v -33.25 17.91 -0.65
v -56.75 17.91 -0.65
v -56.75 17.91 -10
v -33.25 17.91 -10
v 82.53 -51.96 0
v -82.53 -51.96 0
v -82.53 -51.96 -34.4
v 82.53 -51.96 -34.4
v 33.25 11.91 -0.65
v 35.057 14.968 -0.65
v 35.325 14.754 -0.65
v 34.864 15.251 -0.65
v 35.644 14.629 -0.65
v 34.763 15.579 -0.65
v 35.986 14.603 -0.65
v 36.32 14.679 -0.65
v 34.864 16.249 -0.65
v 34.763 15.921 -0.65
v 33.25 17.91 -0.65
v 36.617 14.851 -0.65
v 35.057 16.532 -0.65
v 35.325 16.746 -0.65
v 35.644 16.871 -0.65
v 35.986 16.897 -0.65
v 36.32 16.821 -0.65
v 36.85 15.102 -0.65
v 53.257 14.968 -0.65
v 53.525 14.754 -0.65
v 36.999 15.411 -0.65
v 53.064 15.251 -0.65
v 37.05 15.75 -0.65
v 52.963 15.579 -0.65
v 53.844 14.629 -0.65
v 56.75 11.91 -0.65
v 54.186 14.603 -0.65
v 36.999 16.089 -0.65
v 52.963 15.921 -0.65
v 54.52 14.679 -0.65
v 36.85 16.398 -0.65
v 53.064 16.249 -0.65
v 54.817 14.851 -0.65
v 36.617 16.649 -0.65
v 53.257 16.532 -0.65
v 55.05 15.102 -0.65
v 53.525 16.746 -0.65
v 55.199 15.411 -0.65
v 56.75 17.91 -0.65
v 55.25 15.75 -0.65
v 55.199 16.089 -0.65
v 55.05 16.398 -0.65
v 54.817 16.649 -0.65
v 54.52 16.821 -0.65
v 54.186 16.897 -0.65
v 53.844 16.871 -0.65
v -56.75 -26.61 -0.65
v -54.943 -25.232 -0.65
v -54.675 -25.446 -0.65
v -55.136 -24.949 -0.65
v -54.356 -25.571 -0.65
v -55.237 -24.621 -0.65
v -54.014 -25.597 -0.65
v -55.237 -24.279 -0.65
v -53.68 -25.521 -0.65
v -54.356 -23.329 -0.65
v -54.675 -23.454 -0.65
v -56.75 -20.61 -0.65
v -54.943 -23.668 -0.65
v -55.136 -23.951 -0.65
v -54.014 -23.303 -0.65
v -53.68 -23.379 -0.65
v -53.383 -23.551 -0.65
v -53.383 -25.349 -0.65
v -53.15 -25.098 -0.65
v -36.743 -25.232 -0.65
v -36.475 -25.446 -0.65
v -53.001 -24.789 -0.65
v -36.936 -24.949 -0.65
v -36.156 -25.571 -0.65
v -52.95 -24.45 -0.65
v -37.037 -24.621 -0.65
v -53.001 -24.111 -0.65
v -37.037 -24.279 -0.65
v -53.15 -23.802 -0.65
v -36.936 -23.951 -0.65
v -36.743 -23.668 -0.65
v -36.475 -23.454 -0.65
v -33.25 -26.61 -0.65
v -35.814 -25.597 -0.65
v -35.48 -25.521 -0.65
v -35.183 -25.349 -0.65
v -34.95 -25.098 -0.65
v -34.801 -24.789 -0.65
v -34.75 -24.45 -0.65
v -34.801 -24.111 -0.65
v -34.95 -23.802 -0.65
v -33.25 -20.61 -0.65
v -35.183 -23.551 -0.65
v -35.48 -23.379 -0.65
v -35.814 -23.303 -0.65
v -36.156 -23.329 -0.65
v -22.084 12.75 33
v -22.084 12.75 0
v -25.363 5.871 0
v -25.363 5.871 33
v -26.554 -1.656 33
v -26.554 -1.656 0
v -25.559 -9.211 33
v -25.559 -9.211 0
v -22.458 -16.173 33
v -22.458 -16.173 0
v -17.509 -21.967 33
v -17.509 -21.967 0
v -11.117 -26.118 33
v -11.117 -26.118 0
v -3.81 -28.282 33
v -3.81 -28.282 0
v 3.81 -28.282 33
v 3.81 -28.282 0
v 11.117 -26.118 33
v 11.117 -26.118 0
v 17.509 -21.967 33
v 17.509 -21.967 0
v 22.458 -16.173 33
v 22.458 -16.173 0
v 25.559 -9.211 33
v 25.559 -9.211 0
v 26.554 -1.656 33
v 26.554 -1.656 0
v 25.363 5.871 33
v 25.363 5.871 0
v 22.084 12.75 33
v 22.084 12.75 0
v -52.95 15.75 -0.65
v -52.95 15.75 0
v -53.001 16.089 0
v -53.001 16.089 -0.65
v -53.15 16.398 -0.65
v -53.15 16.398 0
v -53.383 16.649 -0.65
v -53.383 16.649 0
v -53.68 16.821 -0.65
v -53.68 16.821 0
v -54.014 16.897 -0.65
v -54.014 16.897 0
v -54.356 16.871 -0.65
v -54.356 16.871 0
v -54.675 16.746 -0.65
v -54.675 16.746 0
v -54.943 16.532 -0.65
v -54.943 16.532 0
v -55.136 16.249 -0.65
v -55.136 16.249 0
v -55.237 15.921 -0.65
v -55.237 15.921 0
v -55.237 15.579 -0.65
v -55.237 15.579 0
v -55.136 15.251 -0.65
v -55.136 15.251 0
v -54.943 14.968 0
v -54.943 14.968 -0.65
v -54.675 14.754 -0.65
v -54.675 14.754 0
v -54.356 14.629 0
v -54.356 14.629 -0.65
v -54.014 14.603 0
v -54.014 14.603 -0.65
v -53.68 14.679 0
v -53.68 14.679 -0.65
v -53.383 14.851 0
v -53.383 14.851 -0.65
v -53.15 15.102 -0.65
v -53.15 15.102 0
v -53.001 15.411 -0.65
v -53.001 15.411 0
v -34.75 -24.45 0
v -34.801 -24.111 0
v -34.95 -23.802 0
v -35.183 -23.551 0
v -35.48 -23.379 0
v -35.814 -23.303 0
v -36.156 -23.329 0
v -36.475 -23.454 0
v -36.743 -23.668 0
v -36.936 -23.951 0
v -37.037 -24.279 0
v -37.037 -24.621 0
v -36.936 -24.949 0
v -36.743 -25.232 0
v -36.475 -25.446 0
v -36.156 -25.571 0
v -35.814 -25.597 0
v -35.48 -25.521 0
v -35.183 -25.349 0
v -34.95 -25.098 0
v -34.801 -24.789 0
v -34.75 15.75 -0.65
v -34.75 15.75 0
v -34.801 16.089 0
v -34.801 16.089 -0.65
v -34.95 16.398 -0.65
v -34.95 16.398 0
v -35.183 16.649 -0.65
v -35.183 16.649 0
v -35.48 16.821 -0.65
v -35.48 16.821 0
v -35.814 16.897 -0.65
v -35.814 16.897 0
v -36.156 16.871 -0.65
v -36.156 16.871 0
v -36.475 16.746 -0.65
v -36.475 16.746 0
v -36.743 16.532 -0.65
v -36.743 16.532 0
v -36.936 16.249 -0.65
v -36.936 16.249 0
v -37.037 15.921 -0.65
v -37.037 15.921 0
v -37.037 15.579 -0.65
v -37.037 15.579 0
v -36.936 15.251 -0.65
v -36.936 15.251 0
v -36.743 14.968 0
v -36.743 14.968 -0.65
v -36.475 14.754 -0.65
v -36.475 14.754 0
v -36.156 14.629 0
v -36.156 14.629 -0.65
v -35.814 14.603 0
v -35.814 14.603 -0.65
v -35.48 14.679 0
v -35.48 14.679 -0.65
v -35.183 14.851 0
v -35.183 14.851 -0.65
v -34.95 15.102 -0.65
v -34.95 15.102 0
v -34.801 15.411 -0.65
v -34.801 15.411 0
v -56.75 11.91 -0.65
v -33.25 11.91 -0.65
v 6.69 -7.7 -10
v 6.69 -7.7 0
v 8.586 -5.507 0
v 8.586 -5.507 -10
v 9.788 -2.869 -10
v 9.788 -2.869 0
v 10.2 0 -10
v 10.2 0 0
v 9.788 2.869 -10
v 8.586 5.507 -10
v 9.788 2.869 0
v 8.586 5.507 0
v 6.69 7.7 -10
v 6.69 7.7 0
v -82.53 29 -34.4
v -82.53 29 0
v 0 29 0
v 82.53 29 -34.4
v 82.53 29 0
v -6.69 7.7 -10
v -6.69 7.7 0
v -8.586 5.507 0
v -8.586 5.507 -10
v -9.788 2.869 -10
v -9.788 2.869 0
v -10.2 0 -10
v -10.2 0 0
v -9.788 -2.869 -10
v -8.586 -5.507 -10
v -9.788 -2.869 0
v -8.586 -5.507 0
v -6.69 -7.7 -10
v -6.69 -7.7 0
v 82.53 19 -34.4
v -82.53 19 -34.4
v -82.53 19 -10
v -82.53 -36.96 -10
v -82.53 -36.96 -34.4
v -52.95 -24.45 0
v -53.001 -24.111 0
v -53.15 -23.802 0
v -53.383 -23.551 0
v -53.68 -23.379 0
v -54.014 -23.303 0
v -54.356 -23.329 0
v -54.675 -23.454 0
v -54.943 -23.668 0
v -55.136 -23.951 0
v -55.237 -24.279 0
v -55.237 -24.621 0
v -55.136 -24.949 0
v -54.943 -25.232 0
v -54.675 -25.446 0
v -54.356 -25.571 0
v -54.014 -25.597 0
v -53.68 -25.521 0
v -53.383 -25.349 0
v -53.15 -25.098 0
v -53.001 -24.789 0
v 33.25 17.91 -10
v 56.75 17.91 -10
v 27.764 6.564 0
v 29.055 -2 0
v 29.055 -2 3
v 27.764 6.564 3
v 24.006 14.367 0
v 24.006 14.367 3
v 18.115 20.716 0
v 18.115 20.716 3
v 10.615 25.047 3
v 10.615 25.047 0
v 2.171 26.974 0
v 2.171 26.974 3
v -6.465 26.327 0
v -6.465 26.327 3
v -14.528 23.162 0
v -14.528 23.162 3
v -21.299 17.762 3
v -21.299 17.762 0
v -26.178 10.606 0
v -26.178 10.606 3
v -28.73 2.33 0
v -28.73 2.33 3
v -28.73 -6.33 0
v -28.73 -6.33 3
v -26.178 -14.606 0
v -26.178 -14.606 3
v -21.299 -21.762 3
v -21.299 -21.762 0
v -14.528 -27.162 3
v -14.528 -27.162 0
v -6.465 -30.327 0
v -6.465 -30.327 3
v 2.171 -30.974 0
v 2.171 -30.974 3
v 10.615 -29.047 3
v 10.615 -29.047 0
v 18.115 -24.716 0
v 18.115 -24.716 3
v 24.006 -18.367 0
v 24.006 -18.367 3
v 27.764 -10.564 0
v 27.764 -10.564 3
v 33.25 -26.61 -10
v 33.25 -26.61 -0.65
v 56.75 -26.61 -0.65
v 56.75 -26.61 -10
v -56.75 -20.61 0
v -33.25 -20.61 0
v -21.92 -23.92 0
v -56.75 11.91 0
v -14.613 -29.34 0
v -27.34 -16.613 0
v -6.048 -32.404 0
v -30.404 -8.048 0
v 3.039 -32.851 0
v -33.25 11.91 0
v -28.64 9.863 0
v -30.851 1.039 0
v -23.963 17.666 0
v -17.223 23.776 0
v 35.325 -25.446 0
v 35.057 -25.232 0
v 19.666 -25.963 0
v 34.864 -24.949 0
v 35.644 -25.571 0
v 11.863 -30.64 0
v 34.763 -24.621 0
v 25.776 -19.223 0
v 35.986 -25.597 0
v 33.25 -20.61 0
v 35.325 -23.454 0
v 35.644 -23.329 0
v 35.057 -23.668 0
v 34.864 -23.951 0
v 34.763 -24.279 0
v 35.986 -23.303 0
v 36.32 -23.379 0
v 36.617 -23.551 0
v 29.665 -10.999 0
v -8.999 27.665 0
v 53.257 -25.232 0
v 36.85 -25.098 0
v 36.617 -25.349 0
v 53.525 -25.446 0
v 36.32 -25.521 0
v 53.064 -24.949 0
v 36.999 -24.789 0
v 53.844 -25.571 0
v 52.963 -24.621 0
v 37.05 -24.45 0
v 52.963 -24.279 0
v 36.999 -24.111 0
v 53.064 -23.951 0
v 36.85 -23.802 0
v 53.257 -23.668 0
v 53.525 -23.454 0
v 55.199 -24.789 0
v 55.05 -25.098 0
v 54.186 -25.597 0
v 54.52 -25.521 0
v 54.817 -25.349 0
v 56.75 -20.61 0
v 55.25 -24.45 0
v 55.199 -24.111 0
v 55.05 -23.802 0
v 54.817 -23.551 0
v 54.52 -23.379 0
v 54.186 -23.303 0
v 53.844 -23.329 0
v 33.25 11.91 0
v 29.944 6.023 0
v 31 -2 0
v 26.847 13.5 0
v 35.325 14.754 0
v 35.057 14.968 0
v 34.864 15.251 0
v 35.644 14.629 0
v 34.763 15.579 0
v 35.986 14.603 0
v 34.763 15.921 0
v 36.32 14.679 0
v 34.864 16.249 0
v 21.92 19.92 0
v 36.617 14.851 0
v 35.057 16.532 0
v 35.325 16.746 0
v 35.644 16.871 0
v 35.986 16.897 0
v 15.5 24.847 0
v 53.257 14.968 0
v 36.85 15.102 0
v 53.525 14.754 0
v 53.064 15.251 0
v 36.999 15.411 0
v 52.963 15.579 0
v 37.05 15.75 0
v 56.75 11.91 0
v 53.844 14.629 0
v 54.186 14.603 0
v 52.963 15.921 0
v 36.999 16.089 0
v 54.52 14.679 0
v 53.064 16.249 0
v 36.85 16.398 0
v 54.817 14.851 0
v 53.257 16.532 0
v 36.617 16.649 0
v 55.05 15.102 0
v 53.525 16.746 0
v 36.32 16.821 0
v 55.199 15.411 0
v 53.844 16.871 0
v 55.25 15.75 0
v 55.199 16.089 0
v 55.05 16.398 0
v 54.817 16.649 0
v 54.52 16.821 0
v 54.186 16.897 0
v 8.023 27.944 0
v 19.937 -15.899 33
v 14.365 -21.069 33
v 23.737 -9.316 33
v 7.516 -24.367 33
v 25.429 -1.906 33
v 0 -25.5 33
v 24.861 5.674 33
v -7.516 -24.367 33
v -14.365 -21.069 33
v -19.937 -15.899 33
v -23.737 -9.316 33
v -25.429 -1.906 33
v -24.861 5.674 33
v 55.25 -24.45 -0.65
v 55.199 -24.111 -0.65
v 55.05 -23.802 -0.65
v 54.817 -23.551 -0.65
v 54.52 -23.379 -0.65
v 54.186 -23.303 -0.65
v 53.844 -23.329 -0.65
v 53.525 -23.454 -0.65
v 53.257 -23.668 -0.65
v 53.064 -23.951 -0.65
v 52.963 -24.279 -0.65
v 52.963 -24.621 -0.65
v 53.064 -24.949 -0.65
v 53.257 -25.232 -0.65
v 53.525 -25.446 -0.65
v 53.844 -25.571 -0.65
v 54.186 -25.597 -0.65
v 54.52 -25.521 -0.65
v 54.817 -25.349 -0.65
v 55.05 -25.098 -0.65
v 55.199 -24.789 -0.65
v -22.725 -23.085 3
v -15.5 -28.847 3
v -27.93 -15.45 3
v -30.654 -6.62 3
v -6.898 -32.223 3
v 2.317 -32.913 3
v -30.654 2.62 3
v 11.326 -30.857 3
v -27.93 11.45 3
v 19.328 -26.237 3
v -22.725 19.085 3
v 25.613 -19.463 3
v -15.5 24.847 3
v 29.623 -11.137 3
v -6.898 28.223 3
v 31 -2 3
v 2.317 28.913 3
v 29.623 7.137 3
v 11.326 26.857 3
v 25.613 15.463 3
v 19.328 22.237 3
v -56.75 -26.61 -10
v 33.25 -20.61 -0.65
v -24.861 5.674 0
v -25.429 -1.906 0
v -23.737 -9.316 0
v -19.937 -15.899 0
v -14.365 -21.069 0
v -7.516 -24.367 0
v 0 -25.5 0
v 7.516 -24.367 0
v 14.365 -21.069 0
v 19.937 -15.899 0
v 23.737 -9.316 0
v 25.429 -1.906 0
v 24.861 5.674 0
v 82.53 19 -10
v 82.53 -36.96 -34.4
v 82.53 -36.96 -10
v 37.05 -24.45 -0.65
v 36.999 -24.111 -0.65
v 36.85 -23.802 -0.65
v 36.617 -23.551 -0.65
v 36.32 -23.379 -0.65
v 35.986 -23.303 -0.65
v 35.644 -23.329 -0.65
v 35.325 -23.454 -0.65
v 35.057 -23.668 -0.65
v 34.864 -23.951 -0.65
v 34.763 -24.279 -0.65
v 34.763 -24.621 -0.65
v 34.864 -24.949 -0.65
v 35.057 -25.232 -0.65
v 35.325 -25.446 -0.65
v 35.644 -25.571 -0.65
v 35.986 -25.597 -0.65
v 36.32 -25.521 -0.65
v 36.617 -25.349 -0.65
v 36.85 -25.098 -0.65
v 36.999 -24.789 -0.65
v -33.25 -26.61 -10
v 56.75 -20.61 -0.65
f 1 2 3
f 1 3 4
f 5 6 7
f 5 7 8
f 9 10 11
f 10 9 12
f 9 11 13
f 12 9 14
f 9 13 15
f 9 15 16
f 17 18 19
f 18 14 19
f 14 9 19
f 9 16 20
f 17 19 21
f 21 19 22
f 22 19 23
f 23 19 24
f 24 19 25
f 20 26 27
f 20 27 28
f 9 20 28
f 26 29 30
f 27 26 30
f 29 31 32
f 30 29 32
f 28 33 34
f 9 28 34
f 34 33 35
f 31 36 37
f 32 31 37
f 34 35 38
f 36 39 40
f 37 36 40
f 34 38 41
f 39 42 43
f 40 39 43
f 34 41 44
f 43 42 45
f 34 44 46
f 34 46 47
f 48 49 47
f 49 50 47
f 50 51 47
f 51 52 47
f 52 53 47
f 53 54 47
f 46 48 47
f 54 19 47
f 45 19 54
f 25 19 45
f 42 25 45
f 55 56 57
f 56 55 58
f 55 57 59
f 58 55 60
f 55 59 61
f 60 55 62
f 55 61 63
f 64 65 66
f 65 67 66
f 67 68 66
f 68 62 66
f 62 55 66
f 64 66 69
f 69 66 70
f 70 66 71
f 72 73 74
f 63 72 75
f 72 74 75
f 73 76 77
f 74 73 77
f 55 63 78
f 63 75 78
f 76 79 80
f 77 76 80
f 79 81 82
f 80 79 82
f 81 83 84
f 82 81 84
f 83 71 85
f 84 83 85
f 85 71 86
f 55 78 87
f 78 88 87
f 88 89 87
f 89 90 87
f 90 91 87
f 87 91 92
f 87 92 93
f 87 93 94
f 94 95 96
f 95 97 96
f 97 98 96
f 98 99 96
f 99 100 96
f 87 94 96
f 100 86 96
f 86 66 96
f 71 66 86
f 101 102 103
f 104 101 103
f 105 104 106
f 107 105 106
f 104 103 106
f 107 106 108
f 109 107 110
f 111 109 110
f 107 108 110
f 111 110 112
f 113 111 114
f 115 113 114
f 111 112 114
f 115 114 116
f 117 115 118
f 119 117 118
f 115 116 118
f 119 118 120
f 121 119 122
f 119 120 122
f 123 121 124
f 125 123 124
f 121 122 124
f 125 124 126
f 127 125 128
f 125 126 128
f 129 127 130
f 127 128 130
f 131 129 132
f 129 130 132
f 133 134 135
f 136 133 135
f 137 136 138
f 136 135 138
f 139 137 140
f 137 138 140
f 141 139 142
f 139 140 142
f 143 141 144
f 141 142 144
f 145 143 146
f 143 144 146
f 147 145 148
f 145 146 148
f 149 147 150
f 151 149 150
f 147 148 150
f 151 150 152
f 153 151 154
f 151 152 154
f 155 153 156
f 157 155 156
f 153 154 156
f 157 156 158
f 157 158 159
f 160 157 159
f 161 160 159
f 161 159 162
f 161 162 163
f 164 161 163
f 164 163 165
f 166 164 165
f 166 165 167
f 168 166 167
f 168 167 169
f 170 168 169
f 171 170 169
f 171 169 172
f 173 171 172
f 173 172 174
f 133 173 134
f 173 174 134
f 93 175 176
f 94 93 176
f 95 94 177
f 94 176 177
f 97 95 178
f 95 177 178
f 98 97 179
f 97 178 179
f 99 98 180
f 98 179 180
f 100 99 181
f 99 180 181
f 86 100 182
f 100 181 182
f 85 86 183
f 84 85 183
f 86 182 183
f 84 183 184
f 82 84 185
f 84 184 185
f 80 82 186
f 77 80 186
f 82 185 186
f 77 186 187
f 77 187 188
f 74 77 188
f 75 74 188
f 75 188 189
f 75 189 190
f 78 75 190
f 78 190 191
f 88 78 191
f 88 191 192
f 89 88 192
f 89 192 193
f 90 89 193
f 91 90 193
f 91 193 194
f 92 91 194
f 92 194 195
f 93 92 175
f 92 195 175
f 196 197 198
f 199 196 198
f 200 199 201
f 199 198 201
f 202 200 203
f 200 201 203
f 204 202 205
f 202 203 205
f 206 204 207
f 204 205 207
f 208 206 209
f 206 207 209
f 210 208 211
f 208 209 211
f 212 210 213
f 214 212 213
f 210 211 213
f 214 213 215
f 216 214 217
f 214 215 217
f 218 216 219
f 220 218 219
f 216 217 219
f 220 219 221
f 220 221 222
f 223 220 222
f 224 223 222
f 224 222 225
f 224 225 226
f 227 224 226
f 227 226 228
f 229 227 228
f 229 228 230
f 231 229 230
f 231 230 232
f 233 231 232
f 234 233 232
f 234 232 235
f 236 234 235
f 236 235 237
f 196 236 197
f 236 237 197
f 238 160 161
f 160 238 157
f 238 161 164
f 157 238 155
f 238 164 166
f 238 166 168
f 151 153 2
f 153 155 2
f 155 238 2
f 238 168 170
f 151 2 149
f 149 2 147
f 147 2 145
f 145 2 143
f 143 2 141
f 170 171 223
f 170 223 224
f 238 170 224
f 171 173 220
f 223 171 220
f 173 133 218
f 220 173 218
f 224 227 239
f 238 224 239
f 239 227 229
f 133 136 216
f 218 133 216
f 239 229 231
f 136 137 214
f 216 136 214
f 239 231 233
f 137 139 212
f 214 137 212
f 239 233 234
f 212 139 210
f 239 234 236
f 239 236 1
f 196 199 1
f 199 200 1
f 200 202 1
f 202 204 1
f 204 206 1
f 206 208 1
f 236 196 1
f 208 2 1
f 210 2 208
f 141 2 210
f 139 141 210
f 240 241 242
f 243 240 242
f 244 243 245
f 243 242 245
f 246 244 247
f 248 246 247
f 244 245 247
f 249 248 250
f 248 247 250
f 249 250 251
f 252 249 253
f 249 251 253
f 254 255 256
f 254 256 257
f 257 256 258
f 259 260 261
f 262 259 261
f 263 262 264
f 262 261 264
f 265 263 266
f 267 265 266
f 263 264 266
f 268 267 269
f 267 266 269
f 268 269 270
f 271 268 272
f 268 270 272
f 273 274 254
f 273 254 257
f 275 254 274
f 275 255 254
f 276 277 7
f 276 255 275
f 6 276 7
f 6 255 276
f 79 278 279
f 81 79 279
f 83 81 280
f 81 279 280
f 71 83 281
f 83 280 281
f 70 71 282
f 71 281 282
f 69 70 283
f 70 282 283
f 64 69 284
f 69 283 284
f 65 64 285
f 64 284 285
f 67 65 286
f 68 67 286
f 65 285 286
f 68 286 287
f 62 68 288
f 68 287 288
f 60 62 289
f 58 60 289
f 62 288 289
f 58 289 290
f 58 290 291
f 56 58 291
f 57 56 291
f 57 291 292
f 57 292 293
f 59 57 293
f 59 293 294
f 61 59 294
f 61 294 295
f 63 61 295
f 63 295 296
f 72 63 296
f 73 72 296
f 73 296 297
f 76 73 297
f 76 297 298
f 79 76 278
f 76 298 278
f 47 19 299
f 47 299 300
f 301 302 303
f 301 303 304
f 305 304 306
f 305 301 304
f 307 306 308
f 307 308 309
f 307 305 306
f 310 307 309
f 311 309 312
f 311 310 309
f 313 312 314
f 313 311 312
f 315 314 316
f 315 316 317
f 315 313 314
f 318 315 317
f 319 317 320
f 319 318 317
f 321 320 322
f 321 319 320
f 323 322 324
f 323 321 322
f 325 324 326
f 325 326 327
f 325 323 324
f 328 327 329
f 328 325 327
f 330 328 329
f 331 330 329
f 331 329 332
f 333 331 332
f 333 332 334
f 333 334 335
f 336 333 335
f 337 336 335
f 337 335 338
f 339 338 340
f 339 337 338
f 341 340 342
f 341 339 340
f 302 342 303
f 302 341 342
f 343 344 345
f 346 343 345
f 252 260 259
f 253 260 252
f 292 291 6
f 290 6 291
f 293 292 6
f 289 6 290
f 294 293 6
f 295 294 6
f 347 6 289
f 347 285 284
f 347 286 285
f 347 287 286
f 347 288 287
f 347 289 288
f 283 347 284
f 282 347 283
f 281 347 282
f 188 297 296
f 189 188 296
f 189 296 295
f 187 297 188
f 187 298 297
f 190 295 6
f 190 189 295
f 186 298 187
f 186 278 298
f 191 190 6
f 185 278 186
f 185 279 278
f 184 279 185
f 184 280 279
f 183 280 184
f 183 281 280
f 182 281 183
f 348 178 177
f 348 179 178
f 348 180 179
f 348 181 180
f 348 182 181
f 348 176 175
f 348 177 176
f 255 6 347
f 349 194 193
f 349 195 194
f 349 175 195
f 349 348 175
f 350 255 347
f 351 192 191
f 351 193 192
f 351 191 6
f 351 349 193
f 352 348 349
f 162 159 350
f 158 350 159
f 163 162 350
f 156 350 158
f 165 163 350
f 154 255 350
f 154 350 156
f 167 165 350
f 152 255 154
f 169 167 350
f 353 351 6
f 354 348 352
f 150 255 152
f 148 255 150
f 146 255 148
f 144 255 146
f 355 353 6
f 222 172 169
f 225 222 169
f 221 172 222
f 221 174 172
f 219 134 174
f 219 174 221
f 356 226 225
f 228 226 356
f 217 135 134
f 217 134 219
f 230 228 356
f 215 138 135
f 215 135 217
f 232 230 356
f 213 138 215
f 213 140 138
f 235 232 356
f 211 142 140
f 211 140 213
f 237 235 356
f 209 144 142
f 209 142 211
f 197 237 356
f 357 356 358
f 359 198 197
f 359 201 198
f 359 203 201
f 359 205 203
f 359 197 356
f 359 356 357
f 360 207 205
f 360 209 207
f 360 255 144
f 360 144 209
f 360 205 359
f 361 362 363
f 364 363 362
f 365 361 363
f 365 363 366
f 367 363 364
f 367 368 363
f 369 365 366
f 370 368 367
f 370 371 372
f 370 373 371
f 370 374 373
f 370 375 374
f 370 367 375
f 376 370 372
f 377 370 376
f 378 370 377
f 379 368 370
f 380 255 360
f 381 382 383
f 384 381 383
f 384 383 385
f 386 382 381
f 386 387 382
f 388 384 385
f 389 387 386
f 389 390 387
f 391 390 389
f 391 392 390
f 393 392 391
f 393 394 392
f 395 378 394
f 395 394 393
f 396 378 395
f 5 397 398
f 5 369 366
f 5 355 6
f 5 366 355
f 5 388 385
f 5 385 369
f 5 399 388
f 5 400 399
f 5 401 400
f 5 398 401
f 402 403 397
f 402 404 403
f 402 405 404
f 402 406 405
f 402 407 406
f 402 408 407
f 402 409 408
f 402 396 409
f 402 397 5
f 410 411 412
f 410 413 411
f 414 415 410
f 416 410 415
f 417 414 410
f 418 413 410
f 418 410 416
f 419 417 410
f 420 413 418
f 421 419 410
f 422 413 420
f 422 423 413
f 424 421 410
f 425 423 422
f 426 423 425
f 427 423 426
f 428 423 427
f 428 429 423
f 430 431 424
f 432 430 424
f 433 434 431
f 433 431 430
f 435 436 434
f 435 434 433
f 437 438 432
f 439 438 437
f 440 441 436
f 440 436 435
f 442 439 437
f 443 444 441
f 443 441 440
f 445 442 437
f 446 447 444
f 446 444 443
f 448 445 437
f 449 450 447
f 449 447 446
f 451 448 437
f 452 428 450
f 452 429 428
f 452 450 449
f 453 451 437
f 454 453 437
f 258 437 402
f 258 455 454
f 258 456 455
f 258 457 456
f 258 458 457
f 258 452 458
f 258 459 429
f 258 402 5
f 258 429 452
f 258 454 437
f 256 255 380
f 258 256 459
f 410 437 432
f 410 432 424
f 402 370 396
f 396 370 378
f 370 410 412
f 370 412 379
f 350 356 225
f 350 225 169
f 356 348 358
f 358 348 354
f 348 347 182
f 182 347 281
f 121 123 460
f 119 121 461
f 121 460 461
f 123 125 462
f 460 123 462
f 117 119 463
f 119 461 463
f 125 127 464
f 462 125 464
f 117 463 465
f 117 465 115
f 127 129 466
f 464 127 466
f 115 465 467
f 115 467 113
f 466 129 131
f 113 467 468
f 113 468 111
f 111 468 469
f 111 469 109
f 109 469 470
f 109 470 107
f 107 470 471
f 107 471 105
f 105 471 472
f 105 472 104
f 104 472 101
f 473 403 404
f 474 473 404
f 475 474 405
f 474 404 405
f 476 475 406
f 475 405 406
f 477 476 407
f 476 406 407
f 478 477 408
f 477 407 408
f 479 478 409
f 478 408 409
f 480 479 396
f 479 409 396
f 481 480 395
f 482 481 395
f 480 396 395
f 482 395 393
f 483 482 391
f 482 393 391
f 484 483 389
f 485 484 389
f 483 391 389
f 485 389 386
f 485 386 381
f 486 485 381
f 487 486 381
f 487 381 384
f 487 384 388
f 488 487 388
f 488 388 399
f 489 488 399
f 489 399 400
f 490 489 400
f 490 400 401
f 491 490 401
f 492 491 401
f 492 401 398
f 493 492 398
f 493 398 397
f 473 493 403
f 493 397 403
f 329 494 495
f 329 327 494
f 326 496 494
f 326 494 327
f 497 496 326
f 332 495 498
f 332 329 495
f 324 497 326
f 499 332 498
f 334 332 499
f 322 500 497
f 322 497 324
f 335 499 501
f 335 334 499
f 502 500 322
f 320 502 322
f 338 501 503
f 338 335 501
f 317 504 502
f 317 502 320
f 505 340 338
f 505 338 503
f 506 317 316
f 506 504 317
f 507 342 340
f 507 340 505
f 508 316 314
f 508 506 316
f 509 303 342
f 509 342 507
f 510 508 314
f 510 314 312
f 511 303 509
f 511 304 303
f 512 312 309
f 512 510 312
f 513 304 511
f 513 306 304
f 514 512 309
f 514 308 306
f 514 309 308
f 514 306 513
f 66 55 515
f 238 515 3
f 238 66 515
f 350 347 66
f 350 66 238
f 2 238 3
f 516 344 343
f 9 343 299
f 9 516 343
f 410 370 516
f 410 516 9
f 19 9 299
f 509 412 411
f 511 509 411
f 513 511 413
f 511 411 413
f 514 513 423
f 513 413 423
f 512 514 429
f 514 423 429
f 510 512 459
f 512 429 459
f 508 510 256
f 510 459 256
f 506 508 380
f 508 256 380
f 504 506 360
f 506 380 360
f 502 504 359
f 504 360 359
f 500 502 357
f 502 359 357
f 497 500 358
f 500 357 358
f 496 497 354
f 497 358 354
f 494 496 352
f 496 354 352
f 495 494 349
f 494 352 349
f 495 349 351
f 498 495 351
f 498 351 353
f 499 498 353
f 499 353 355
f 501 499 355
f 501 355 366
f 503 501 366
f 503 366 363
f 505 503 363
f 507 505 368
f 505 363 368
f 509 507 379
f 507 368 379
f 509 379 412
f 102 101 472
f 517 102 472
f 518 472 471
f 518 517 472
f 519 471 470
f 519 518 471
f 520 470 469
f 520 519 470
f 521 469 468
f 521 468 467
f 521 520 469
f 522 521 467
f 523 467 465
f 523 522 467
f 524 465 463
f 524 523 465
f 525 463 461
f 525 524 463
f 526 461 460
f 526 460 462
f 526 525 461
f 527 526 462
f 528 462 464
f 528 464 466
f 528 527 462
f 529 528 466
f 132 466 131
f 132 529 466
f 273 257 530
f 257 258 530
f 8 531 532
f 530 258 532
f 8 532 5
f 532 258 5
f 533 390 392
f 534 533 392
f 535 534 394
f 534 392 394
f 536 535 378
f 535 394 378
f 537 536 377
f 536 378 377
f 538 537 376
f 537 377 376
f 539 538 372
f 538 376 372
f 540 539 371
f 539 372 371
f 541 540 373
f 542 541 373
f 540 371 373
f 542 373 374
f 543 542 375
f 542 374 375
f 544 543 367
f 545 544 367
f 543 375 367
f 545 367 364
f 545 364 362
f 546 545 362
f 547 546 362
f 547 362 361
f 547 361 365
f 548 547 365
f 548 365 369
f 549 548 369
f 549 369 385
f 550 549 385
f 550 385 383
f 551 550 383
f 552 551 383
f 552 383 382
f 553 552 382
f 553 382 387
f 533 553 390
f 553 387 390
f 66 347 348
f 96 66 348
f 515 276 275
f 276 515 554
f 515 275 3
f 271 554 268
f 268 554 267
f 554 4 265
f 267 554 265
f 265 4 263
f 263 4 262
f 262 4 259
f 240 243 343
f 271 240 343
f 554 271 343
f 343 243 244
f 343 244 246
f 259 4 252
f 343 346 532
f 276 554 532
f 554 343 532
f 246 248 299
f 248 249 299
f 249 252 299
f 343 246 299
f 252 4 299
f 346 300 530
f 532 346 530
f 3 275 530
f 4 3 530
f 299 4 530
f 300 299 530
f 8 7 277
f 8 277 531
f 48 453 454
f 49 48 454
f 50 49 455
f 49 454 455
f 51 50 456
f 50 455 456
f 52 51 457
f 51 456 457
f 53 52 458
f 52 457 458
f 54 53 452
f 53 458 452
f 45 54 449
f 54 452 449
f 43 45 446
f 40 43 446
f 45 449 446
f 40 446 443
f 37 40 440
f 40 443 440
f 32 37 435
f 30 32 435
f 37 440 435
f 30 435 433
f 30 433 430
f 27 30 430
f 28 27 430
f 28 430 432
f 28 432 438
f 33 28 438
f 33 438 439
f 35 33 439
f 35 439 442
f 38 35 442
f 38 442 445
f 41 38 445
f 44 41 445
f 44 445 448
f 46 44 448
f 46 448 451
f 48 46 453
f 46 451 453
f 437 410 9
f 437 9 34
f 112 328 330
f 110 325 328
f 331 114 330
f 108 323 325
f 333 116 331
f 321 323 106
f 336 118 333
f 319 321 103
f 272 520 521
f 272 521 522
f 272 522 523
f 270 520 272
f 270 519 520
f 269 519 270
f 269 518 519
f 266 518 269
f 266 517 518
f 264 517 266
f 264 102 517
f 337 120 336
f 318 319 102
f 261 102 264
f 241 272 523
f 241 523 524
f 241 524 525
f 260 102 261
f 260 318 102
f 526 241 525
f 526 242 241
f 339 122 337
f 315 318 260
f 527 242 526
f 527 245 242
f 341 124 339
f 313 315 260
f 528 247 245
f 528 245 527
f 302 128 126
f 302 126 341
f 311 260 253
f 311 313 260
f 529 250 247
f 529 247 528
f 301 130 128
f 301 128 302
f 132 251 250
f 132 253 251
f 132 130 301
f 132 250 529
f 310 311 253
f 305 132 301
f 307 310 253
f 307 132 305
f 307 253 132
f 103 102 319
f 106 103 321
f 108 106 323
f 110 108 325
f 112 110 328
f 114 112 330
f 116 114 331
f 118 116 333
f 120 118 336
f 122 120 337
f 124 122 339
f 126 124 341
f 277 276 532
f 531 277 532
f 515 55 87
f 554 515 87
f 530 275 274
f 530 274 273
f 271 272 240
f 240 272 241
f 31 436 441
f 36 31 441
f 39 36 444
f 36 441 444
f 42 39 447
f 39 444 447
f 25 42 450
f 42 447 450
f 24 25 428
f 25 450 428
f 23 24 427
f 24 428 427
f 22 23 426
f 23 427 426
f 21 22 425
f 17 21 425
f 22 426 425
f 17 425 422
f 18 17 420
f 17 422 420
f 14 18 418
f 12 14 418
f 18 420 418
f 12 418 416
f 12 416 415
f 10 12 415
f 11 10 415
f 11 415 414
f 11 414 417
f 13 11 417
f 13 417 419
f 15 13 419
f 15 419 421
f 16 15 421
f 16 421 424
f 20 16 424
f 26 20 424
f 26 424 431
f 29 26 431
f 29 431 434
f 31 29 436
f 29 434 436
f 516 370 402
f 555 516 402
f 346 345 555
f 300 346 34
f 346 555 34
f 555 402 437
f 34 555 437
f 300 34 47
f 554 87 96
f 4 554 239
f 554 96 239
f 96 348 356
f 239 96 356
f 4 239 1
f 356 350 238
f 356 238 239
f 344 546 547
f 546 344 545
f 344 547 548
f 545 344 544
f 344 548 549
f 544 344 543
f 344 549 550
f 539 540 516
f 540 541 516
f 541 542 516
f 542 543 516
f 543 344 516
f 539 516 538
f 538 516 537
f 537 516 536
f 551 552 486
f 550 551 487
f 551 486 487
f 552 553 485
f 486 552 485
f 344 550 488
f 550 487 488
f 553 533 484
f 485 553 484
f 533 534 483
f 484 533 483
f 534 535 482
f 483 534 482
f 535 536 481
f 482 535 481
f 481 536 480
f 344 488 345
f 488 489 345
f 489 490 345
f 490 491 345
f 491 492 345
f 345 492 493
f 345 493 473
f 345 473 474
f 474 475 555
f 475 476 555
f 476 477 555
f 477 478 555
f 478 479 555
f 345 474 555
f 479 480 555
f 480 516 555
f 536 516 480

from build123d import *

# Parameters (mm, degrees)
PAD002_DEPTH  = 33
SKETCH003_W   = 165.06
SKETCH003_H   = 80.96
SKETCH003_W_2 = 23.5
SKETCH003_H_2 = 44.52
PAD003_DEPTH  = 10
SKETCH004_R   = 31
SKETCH004_R_2 = 29.055
PAD004_DEPTH  = 3
SKETCH033_W   = 165.06
SKETCH033_H   = 10
SKETCH033_H_2 = 15
PAD029_DEPTH  = 24.4
SKETCH034_W   = 23.5
SKETCH034_H   = 6
SKETCH034_R   = 1.15
PAD030_DEPTH  = 0.65


with BuildPart() as part:
    # Sketch002 → Pad002 (new body)
    with BuildSketch(Plane.XY):
        with BuildLine():
            ThreePointArc((-22.083648, 12.75), (0, -25.5), (22.083648, 12.75))
            ThreePointArc((-22.083648, 12.75), (0, -28.556543), (22.083648, 12.75))
        make_face()
    extrude(amount=PAD002_DEPTH)

    # Sketch003 → Pad003 (join)
    with BuildSketch(Plane.XY):
        with Locations((0, -11.48)):
            Rectangle(SKETCH003_W, SKETCH003_H)
        with BuildLine():
            ThreePointArc((-6.689544, 7.7), (-10.2, 0), (-6.689544, -7.7))
            Line((-6.689544, -7.7), (6.689544, -7.7))
            ThreePointArc((6.689544, -7.7), (10.2, 0), (6.689544, 7.7))
            Line((-6.689544, 7.7), (6.689544, 7.7))
        make_face(mode=Mode.SUBTRACT)
        with Locations((45, -4.35)):
            Rectangle(SKETCH003_W_2, SKETCH003_H_2, mode=Mode.SUBTRACT)
        with Locations((-45, -4.35)):
            Rectangle(SKETCH003_W_2, SKETCH003_H_2, mode=Mode.SUBTRACT)
    extrude(amount=-PAD003_DEPTH)

    # Sketch004 (on Face3 of Pad003) → Pad004 (join)
    with BuildSketch(Plane.XY):
        with Locations((0, -2)):
            Circle(SKETCH004_R)
        with Locations((0, -2)):
            Circle(SKETCH004_R_2, mode=Mode.SUBTRACT)
    extrude(amount=PAD004_DEPTH)

    # Sketch033 (on Face11 of Pad004) → Pad029 (join)
    with BuildSketch(Plane(origin=(0, 0, -10), x_dir=(1, 0, 0), z_dir=(0, 0, -1))):
        with Locations((0, -24)):
            Rectangle(SKETCH033_W, SKETCH033_H)
        with Locations((0, 44.46)):
            Rectangle(SKETCH033_W, SKETCH033_H_2)
    extrude(amount=PAD029_DEPTH)

    # Sketch034 (on Face25 of Pad029) → Pad030 (join)
    with BuildSketch(Plane.XY):
        with Locations((45, 14.91)):
            Rectangle(SKETCH034_W, SKETCH034_H)
        with Locations((35.9, 15.75)):
            Circle(SKETCH034_R, mode=Mode.SUBTRACT)
        with Locations((54.1, 15.75)):
            Circle(SKETCH034_R, mode=Mode.SUBTRACT)
        with Locations((45, -23.61)):
            Rectangle(SKETCH034_W, SKETCH034_H)
        with Locations((35.9, -24.45)):
            Circle(SKETCH034_R, mode=Mode.SUBTRACT)
        with Locations((54.1, -24.45)):
            Circle(SKETCH034_R, mode=Mode.SUBTRACT)
        with Locations((-45, 14.91)):
            Rectangle(SKETCH034_W, SKETCH034_H)
        with Locations((-35.9, 15.75)):
            Circle(SKETCH034_R, mode=Mode.SUBTRACT)
        with Locations((-54.1, 15.75)):
            Circle(SKETCH034_R, mode=Mode.SUBTRACT)
        with Locations((-45, -23.61)):
            Rectangle(SKETCH034_W, SKETCH034_H)
        with Locations((-35.9, -24.45)):
            Circle(SKETCH034_R, mode=Mode.SUBTRACT)
        with Locations((-54.1, -24.45)):
            Circle(SKETCH034_R, mode=Mode.SUBTRACT)
    extrude(amount=-PAD030_DEPTH)


solid = part.part
